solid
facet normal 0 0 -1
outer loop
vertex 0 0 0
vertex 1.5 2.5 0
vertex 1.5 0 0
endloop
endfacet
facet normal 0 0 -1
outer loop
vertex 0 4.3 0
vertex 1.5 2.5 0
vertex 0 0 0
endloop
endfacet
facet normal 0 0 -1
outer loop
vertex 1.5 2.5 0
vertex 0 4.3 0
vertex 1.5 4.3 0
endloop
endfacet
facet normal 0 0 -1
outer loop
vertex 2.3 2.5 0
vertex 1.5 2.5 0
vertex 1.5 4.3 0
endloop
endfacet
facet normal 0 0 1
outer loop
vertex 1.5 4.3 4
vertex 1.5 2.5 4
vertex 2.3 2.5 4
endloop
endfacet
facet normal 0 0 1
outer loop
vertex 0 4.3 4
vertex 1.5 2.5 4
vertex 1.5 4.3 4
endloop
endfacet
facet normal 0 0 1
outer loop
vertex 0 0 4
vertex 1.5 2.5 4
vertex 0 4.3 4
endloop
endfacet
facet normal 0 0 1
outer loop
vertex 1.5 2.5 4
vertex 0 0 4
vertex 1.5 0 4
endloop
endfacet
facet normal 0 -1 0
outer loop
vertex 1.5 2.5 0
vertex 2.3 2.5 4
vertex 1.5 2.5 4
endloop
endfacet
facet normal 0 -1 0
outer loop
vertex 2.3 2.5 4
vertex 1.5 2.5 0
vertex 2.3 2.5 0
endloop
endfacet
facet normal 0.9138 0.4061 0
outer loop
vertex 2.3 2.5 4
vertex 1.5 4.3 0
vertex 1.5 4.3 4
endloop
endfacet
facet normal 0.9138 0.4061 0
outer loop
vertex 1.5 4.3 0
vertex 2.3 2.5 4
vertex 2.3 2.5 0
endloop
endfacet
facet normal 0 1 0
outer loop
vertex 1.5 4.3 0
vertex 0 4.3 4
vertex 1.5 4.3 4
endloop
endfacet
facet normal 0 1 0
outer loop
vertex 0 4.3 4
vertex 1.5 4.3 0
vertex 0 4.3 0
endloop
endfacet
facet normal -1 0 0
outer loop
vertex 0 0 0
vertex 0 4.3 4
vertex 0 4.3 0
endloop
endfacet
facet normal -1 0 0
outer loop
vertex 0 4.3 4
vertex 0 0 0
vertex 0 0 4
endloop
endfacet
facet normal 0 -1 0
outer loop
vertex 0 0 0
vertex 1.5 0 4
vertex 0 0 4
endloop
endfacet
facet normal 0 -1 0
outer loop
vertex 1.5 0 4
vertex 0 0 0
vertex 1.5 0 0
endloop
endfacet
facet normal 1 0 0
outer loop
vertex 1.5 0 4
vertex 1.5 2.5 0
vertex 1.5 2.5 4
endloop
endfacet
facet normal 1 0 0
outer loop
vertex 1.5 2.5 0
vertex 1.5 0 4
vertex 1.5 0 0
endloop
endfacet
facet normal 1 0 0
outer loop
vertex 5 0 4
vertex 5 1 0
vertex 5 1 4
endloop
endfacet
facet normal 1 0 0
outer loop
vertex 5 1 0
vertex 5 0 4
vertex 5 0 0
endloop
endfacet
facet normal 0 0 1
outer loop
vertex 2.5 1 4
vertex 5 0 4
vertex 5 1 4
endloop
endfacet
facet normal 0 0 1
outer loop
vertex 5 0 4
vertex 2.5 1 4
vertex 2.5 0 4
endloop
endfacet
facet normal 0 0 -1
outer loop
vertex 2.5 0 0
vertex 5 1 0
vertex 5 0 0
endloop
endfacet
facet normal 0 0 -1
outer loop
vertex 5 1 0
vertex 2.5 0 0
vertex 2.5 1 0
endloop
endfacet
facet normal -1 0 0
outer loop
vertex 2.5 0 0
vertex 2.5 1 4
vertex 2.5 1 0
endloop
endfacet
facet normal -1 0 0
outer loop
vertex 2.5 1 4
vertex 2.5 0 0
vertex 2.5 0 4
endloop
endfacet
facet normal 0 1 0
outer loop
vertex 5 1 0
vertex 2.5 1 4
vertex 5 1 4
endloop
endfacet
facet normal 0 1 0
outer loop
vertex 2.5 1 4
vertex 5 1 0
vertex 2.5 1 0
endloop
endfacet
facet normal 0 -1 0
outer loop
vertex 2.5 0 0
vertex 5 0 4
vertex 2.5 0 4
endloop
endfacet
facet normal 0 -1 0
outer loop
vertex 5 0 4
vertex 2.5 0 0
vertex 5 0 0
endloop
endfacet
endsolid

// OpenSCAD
linear_extrude(4)polygon(points=[[0,0],[1.5,0],[1.5,2.5],[2.3,2.5],[1.5,4.3],[0,4.3]]);
translate([02.5,0,0])cube([2.5,1,4]);
